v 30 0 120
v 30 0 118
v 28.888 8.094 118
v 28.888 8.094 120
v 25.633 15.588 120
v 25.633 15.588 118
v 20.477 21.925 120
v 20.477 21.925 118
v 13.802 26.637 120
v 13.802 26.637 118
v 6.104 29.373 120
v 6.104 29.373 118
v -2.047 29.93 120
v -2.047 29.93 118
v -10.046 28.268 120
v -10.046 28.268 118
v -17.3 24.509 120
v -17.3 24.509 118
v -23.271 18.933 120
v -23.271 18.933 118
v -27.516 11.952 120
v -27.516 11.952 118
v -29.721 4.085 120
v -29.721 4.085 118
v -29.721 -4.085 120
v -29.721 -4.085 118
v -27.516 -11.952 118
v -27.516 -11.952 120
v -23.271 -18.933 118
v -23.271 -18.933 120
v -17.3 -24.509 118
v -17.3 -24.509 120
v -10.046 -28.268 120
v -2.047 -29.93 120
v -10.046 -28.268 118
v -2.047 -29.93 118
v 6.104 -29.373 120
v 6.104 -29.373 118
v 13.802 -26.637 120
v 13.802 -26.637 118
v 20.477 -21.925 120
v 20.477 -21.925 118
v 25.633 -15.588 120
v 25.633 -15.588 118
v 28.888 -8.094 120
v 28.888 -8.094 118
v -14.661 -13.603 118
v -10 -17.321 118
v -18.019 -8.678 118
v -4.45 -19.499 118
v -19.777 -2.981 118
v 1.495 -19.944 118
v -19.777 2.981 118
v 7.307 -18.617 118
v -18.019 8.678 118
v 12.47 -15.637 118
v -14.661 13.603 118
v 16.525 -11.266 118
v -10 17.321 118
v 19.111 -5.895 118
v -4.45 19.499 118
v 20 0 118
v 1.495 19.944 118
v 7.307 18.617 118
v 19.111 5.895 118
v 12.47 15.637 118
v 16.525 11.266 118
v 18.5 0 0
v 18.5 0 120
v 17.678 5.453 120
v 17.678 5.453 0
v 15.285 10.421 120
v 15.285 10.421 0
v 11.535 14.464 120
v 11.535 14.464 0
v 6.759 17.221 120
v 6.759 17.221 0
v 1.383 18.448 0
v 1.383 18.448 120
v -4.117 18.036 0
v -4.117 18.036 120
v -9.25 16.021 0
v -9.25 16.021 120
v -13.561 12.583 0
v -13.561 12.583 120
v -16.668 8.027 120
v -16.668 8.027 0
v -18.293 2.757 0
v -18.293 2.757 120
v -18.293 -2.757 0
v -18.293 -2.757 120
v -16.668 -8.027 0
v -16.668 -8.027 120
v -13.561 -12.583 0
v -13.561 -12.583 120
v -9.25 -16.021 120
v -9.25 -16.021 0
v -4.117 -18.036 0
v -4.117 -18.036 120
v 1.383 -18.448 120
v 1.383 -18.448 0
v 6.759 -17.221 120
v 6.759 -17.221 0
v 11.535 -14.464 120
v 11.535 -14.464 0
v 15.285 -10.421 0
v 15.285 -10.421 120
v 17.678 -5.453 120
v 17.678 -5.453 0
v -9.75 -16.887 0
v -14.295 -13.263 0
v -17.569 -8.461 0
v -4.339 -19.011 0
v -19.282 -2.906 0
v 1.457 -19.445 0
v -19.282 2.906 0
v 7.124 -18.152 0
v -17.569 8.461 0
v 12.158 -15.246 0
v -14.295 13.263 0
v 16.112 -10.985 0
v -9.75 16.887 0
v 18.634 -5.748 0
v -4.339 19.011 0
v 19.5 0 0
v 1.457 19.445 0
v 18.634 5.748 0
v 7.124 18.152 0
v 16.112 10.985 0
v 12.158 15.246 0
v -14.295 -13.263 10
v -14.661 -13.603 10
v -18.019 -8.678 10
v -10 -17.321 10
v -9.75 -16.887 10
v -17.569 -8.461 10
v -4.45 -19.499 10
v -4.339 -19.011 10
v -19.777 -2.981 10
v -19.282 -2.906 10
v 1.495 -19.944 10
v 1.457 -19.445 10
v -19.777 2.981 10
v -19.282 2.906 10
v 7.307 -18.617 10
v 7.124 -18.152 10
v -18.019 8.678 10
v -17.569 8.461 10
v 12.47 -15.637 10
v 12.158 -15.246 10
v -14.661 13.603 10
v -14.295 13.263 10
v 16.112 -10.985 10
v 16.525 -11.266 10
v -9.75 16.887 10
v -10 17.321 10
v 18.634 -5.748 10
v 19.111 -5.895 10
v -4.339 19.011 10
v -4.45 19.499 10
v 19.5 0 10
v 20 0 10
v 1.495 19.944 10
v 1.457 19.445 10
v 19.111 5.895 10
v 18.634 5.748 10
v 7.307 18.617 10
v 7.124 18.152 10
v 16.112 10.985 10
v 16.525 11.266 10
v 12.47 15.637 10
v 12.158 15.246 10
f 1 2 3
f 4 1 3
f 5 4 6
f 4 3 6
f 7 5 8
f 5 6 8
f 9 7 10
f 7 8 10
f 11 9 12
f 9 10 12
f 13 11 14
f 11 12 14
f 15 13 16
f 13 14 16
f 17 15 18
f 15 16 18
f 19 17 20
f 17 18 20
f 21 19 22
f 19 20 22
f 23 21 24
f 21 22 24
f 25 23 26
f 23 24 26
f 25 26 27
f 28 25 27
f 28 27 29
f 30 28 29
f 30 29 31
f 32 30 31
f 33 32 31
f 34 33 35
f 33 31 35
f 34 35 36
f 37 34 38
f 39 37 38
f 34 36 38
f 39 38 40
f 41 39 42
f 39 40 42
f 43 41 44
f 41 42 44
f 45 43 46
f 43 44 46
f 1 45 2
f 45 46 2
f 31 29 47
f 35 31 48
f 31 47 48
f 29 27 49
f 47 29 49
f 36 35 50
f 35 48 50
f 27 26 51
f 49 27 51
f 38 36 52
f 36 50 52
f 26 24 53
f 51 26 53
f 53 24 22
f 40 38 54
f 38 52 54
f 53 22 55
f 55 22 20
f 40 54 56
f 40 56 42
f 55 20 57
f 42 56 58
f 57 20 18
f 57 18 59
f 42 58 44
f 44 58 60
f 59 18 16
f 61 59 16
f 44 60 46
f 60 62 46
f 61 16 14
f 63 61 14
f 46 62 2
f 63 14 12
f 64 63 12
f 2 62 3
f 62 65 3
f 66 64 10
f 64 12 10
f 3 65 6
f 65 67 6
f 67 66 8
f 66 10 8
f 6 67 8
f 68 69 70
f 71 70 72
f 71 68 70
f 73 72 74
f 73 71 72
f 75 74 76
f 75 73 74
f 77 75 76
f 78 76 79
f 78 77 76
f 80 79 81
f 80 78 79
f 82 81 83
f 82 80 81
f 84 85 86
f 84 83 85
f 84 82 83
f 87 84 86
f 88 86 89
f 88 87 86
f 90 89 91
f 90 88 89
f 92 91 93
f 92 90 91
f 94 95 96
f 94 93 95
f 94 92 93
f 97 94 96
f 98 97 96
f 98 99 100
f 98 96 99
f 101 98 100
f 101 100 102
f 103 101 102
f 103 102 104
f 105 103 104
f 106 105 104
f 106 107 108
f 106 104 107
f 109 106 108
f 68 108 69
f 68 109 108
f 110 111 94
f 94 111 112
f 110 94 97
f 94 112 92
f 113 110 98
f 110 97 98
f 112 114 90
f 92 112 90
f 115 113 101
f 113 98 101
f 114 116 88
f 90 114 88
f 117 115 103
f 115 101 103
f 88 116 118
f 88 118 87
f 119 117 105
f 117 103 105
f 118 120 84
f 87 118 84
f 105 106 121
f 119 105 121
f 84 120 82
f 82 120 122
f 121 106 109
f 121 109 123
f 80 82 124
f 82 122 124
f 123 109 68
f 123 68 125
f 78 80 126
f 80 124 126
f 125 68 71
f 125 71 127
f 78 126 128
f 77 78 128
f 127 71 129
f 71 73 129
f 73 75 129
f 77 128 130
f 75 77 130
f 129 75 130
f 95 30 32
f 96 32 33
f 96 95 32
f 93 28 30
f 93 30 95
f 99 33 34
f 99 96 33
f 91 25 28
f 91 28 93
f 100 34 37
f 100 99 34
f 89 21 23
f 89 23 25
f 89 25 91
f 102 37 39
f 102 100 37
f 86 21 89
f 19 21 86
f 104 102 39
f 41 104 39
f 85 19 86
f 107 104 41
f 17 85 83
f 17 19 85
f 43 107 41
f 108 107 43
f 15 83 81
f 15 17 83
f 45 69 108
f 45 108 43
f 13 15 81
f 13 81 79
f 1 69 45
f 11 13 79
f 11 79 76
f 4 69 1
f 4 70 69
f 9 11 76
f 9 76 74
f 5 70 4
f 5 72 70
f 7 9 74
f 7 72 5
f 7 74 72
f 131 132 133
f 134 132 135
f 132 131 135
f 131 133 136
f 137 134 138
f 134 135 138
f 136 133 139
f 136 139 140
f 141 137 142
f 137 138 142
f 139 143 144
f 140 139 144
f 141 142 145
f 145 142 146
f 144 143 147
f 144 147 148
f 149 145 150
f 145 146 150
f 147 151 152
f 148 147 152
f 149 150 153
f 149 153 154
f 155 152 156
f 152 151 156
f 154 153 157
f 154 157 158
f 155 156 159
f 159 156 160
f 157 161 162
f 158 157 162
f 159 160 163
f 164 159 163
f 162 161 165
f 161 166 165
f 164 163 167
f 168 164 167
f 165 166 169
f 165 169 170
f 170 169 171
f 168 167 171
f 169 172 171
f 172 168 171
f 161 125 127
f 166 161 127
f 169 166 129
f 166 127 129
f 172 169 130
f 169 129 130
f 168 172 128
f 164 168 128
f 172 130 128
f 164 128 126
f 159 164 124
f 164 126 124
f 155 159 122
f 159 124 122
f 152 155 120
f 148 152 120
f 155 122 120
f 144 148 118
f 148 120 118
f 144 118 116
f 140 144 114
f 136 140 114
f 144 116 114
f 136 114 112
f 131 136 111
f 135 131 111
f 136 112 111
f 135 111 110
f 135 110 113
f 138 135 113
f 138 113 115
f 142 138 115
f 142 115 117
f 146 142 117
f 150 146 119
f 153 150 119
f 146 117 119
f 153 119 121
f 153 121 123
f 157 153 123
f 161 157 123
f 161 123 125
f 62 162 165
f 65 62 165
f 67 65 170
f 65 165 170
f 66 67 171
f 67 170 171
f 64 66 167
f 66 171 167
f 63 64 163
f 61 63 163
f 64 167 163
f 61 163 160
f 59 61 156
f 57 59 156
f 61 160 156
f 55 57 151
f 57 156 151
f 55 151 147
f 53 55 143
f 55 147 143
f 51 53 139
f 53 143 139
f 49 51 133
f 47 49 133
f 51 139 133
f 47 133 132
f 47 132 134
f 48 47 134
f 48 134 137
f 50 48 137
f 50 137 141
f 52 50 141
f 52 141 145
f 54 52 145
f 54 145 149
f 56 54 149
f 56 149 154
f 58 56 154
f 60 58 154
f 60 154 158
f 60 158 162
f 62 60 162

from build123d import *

# Parameters (mm, degrees)
SKETCH_R      = 19.5
PAD_DEPTH     = 10
PAD001_START  = 10
SKETCH002_R   = 20
PAD001_DEPTH  = 110
SKETCH003_R   = 18.5
POCKET_DEPTH  = 120.001
PAD003_START  = 118
SKETCH007_R   = 30
SKETCH007_R_2 = 20
PAD003_DEPTH  = 2


with BuildPart() as part:
    # Sketch → Pad (new body)
    with BuildSketch(Plane.XY):
        Circle(SKETCH_R)
    extrude(amount=PAD_DEPTH)

    # Sketch002 → Pad001 (join)
    with BuildSketch(Plane.XY.offset(PAD001_START)):
        Circle(SKETCH002_R)
    extrude(amount=PAD001_DEPTH)

    # Sketch003 → Pocket (cut, through all)
    with BuildSketch(Plane.XY):
        Circle(SKETCH003_R)
    extrude(amount=POCKET_DEPTH, mode=Mode.SUBTRACT)

    # Sketch007 → Pad003 (join)
    with BuildSketch(Plane.XY.offset(PAD003_START)):
        Circle(SKETCH007_R)
        Circle(SKETCH007_R_2, mode=Mode.SUBTRACT)
    extrude(amount=PAD003_DEPTH)


solid = part.part
